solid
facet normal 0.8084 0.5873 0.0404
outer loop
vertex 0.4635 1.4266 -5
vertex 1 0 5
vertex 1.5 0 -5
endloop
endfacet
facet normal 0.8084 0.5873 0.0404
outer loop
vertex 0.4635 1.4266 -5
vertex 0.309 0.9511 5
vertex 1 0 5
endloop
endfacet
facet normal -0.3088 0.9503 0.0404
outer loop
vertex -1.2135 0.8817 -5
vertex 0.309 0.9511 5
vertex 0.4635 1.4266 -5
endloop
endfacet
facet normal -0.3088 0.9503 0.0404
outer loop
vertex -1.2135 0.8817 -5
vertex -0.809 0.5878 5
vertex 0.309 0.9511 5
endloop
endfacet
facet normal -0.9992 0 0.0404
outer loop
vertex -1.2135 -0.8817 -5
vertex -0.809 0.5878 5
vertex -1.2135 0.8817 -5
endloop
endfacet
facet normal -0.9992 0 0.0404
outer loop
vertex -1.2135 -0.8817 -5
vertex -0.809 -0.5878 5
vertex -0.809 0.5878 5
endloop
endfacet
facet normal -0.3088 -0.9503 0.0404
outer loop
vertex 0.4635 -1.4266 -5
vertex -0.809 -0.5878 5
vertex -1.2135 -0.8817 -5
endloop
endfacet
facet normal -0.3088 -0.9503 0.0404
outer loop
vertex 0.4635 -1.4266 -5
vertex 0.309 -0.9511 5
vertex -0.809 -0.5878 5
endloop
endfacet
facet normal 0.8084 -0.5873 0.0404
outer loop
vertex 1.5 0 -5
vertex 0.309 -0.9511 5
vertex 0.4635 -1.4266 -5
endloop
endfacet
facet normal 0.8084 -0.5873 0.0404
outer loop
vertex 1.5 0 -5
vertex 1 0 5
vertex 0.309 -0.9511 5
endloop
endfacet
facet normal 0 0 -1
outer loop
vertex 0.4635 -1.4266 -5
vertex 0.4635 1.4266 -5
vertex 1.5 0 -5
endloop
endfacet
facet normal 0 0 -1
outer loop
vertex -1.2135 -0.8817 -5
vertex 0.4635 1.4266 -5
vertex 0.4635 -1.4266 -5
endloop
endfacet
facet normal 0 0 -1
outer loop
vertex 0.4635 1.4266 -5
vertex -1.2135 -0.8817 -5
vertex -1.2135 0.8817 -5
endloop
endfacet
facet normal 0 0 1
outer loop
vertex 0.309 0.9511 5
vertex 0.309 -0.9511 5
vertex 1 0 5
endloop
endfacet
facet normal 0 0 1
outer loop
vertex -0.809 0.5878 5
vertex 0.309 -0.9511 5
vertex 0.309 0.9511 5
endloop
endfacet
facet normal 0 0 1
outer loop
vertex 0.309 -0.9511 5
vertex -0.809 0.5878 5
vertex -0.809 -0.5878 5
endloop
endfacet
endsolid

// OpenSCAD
// Unit of length: Unit.MM
cylinder(h = 10.0, d2 = 2.0, d1 = 3.0, center = true);
